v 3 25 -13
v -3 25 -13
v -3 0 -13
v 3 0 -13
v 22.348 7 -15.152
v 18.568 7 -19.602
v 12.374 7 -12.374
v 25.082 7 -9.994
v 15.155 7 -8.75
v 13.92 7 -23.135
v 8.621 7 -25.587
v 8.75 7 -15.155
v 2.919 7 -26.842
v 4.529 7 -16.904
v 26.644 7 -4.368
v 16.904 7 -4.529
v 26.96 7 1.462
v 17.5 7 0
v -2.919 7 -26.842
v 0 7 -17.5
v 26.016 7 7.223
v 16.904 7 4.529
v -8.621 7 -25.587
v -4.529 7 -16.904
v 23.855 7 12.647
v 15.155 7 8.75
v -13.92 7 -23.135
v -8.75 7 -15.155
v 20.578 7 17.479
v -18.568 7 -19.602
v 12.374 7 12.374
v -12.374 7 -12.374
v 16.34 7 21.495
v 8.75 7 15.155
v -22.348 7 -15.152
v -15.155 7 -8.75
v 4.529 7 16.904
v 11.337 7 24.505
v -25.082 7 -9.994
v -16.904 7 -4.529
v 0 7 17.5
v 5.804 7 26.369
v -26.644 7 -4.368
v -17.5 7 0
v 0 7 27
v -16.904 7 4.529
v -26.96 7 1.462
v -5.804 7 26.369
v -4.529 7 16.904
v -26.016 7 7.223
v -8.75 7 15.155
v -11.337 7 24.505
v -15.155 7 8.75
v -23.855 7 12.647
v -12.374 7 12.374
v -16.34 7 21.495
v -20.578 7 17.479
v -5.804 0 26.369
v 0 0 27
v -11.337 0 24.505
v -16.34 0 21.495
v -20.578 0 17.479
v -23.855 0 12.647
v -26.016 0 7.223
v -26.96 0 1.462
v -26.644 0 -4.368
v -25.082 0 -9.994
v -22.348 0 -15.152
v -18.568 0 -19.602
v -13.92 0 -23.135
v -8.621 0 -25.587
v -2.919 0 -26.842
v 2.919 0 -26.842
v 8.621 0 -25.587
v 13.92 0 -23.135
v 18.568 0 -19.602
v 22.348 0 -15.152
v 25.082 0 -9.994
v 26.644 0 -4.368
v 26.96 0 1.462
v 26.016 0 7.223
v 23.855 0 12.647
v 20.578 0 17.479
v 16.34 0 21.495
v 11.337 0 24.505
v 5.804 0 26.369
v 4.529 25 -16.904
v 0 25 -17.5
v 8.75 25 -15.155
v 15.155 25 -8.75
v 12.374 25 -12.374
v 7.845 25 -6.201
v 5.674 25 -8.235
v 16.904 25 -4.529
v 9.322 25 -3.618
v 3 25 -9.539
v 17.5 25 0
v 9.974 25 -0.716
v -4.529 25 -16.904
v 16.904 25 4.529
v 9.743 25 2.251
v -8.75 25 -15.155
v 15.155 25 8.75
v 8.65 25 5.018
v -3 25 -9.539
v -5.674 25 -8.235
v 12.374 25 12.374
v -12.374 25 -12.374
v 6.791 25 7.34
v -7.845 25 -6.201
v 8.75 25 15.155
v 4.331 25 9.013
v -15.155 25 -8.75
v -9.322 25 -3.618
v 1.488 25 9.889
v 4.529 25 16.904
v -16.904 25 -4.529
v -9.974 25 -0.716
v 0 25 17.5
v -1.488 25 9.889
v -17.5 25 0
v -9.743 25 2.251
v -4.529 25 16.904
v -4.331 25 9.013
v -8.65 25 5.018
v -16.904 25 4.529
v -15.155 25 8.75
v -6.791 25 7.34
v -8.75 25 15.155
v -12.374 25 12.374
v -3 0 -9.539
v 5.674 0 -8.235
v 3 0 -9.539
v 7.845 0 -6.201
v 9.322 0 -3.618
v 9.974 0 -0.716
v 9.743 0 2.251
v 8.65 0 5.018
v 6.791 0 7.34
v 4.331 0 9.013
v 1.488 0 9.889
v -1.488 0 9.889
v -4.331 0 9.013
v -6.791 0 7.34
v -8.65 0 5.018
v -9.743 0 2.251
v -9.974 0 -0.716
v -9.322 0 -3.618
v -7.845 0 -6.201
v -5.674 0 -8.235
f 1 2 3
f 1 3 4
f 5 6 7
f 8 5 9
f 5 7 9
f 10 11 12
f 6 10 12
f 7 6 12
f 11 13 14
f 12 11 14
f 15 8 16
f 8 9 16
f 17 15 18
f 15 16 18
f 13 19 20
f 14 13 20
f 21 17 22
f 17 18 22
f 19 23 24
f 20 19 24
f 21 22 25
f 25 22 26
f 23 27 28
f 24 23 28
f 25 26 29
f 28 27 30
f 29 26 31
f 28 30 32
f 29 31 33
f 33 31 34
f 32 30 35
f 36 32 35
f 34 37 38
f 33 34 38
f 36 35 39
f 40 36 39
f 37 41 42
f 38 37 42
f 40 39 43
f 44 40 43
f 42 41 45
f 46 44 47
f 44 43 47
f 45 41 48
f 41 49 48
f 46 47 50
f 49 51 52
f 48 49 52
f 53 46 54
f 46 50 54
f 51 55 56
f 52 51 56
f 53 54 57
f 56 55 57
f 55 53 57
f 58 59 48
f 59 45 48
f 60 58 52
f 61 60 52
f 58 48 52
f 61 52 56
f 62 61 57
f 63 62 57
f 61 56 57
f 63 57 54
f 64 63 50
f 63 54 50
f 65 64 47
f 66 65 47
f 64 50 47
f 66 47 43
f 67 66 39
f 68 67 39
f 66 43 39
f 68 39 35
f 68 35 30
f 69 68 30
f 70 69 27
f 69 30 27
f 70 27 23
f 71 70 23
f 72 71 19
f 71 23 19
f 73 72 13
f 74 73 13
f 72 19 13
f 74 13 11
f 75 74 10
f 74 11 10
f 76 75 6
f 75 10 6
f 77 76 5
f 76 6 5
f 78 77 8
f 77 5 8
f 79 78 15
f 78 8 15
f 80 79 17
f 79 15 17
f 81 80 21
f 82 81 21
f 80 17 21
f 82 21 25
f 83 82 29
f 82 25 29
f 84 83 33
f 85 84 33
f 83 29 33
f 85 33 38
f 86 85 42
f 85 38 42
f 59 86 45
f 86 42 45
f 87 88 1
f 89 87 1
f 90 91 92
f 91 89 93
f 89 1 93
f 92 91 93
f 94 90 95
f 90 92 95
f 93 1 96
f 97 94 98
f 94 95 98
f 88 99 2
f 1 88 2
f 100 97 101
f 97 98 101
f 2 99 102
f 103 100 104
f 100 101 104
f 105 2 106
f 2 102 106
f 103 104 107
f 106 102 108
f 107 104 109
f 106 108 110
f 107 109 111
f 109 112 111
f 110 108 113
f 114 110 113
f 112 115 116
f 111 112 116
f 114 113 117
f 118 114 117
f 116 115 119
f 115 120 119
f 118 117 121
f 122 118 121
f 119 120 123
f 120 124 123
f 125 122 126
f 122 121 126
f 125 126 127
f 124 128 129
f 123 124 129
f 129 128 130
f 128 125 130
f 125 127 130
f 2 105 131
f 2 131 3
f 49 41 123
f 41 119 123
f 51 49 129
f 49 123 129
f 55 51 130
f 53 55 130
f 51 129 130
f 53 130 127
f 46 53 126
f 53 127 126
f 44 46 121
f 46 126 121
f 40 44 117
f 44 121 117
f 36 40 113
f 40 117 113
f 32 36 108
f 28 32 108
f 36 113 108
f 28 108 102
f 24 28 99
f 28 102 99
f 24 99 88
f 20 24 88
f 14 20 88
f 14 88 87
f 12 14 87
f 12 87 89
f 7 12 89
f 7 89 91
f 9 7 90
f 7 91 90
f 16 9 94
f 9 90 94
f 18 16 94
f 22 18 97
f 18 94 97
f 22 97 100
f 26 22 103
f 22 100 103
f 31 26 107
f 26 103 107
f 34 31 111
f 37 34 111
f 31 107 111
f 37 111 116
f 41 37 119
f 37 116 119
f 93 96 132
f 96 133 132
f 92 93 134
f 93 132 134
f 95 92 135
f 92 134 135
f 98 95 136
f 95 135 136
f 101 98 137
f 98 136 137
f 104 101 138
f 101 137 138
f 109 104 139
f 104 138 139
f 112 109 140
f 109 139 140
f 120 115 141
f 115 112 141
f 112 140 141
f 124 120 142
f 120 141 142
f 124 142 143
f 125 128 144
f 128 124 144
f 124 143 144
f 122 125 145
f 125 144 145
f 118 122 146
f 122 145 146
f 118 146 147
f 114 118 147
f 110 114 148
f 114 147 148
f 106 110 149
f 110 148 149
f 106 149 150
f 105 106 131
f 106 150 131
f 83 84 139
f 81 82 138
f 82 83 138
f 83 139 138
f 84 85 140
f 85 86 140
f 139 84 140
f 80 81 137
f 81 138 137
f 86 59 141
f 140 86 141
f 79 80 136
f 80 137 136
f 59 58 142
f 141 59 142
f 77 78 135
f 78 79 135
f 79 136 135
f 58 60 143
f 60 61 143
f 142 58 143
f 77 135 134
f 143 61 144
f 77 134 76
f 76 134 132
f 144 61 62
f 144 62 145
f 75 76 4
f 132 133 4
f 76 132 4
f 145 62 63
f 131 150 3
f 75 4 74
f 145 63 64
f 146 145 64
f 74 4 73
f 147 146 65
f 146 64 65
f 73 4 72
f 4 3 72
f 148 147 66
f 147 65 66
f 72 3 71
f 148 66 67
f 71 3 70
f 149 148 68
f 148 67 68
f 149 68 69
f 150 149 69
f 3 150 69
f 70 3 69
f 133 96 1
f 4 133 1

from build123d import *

# Parameters (mm, degrees)
SKETCH_2_W          = 6
SKETCH_2_H          = 8.902136115
CUT_EXTRUDE_1_DEPTH = 46.639894829


with BuildPart() as part:
    # 草图1 → 旋转1 (revolve)
    with BuildSketch(Plane.XY, mode=Mode.PRIVATE) as revolve_1_sk:
        Polygon((10, 0), (27, 0), (27, 7), (17.5, 7), (17.5, 25), (10, 25), align=None)
    revolve(revolve_1_sk.sketch.rotate(Axis((0, 92.857139703, 0), (0, -1, 0)), 90), axis=Axis((0, 92.857139703, 0), (0, -1, 0)))

    # 草图2 → 切除-拉伸1 (cut, through all)
    with BuildSketch(Plane(origin=(0, 25, 0), x_dir=(1, 0, 0), z_dir=(0, 1, 0))):
        with Locations((0, 8.548931943)):
            Rectangle(SKETCH_2_W, SKETCH_2_H)
    extrude(amount=-CUT_EXTRUDE_1_DEPTH, mode=Mode.SUBTRACT)


solid = part.part
